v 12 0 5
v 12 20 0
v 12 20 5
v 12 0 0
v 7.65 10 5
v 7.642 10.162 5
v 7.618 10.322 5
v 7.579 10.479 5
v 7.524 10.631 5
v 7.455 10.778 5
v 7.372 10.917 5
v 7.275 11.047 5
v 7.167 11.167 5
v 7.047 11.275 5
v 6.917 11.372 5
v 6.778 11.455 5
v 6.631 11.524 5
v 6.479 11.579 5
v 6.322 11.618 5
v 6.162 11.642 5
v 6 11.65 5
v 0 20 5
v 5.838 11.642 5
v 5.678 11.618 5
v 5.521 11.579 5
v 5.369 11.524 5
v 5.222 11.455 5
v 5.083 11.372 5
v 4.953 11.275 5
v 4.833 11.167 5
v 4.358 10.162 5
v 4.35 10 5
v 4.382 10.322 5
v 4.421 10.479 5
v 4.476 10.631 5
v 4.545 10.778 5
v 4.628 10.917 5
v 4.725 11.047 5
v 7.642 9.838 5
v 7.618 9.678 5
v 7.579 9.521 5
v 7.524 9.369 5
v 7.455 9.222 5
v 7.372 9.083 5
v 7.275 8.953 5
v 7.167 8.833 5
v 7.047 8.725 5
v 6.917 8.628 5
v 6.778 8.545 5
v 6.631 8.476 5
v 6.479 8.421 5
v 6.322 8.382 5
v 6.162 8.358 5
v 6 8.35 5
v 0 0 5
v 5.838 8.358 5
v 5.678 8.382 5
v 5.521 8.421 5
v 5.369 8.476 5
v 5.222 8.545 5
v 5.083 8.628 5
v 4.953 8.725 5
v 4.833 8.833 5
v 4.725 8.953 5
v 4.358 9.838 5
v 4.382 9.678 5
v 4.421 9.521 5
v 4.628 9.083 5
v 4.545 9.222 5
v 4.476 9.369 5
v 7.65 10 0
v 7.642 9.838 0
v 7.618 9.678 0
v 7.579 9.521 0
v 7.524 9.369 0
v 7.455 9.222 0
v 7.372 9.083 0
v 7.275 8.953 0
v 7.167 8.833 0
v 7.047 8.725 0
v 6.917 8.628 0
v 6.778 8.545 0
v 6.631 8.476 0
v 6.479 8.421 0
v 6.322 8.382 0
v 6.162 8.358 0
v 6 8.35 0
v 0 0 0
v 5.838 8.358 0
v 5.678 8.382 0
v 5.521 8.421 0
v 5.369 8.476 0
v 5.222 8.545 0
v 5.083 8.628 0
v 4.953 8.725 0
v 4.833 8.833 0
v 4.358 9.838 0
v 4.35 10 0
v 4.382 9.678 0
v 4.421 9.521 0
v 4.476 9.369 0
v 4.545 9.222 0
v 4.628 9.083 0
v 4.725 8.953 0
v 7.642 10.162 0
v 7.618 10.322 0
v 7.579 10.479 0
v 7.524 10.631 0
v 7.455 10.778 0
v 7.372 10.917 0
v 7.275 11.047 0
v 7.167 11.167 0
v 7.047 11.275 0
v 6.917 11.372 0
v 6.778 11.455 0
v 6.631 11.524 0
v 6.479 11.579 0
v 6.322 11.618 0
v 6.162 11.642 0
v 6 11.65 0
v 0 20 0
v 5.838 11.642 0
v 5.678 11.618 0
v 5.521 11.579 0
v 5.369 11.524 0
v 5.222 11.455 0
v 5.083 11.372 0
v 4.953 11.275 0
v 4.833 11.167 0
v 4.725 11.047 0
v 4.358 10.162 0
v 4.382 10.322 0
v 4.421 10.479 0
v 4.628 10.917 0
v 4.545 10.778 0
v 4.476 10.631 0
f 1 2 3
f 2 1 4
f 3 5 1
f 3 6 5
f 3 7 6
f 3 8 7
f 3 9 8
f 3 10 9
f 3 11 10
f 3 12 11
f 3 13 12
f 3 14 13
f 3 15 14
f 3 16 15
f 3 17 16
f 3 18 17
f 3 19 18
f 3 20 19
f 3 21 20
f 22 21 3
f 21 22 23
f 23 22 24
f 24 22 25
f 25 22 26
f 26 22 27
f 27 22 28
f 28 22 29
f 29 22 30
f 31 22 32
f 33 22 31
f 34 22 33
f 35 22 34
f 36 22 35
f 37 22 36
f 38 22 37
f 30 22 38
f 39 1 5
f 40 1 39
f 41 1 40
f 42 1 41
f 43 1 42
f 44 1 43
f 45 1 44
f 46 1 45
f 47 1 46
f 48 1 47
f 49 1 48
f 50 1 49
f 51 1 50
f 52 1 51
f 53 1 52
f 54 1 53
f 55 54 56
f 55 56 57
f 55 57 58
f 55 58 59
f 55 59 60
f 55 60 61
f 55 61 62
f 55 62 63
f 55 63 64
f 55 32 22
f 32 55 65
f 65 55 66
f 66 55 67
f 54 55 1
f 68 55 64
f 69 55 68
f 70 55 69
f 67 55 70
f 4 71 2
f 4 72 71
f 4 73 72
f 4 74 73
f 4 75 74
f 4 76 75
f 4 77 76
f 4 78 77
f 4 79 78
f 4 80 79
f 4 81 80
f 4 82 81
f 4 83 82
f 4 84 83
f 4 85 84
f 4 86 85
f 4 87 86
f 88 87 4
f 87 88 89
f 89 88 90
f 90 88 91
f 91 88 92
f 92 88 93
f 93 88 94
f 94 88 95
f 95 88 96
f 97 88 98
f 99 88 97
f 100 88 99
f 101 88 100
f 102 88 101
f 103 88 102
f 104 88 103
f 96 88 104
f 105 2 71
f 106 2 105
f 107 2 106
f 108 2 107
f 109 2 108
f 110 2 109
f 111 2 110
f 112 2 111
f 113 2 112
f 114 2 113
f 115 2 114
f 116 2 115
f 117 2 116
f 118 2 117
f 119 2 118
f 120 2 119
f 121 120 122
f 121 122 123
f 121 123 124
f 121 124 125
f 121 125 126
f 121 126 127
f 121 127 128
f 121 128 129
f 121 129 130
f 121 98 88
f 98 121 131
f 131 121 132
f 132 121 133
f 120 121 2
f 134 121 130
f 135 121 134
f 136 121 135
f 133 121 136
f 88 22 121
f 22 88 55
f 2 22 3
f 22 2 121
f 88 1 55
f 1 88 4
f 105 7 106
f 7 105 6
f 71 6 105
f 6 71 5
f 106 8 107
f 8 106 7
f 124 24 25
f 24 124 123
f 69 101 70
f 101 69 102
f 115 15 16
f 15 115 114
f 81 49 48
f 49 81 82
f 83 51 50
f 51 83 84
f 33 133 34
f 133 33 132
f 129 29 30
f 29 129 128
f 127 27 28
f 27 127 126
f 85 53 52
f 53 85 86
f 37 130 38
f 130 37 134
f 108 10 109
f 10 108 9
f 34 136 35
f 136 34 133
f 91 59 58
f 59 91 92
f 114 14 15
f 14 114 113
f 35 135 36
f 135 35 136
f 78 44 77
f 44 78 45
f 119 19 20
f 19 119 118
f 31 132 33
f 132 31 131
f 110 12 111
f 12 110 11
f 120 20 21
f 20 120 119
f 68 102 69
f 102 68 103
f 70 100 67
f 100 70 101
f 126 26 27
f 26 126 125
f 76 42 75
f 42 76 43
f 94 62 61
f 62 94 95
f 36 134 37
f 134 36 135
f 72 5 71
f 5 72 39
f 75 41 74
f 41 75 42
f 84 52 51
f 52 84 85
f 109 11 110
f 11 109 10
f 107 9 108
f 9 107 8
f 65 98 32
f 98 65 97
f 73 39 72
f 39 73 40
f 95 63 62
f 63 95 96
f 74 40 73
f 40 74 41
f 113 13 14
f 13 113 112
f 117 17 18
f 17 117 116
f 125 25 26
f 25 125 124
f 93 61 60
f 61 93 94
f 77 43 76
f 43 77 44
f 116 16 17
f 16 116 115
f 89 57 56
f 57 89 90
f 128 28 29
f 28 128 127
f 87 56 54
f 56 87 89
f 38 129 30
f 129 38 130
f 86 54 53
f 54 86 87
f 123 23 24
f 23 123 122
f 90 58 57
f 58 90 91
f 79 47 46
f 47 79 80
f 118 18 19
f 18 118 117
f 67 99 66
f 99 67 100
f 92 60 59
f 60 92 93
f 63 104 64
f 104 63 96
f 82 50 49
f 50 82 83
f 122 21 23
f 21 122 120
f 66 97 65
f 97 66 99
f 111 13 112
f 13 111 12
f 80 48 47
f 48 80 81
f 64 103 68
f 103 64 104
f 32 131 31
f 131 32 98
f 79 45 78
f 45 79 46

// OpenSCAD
width=12;
height=5;
length=20;
sd=3.3;
sr=sd/2;
$fn=64;
module make(){

   difference(){
        union(){
            cube([width,length,height]);       
        }
        translate([width/2,length/2,-0.1]) rotate([0,0,0]) cylinder(r=sr,h=height*1.2);
    }
}

make();
//inset(d=0.3) shape();

// outset(d=0.3) shape();

// rounding(r=0.3) shape();

//fillet(r=0.3) shape();

// shell(d=0.3) shape();

// shell(d=-0.3) shape();

// shell(d=0.3,center=true) shape();

module cutcyla(r,h,cutr=[0,0,0]){
   rotate(cutr) render() difference(){
		cylinder(r=r,h=h);
   	    translate([0,r/2+0.1,h/2]) cube([r*2,r+0.2,h],center=true);
	}
}

module cutcyl(r,h,cutofs,cutr=[0,0,0]){
   rotate(cutr) render() difference(){
			cylinder(r=r,h=h);
   	        translate([0,r/2-cutofs/2,h/2]) cube([r*2,r+cutofs*2,h],center=true);
	}
}
